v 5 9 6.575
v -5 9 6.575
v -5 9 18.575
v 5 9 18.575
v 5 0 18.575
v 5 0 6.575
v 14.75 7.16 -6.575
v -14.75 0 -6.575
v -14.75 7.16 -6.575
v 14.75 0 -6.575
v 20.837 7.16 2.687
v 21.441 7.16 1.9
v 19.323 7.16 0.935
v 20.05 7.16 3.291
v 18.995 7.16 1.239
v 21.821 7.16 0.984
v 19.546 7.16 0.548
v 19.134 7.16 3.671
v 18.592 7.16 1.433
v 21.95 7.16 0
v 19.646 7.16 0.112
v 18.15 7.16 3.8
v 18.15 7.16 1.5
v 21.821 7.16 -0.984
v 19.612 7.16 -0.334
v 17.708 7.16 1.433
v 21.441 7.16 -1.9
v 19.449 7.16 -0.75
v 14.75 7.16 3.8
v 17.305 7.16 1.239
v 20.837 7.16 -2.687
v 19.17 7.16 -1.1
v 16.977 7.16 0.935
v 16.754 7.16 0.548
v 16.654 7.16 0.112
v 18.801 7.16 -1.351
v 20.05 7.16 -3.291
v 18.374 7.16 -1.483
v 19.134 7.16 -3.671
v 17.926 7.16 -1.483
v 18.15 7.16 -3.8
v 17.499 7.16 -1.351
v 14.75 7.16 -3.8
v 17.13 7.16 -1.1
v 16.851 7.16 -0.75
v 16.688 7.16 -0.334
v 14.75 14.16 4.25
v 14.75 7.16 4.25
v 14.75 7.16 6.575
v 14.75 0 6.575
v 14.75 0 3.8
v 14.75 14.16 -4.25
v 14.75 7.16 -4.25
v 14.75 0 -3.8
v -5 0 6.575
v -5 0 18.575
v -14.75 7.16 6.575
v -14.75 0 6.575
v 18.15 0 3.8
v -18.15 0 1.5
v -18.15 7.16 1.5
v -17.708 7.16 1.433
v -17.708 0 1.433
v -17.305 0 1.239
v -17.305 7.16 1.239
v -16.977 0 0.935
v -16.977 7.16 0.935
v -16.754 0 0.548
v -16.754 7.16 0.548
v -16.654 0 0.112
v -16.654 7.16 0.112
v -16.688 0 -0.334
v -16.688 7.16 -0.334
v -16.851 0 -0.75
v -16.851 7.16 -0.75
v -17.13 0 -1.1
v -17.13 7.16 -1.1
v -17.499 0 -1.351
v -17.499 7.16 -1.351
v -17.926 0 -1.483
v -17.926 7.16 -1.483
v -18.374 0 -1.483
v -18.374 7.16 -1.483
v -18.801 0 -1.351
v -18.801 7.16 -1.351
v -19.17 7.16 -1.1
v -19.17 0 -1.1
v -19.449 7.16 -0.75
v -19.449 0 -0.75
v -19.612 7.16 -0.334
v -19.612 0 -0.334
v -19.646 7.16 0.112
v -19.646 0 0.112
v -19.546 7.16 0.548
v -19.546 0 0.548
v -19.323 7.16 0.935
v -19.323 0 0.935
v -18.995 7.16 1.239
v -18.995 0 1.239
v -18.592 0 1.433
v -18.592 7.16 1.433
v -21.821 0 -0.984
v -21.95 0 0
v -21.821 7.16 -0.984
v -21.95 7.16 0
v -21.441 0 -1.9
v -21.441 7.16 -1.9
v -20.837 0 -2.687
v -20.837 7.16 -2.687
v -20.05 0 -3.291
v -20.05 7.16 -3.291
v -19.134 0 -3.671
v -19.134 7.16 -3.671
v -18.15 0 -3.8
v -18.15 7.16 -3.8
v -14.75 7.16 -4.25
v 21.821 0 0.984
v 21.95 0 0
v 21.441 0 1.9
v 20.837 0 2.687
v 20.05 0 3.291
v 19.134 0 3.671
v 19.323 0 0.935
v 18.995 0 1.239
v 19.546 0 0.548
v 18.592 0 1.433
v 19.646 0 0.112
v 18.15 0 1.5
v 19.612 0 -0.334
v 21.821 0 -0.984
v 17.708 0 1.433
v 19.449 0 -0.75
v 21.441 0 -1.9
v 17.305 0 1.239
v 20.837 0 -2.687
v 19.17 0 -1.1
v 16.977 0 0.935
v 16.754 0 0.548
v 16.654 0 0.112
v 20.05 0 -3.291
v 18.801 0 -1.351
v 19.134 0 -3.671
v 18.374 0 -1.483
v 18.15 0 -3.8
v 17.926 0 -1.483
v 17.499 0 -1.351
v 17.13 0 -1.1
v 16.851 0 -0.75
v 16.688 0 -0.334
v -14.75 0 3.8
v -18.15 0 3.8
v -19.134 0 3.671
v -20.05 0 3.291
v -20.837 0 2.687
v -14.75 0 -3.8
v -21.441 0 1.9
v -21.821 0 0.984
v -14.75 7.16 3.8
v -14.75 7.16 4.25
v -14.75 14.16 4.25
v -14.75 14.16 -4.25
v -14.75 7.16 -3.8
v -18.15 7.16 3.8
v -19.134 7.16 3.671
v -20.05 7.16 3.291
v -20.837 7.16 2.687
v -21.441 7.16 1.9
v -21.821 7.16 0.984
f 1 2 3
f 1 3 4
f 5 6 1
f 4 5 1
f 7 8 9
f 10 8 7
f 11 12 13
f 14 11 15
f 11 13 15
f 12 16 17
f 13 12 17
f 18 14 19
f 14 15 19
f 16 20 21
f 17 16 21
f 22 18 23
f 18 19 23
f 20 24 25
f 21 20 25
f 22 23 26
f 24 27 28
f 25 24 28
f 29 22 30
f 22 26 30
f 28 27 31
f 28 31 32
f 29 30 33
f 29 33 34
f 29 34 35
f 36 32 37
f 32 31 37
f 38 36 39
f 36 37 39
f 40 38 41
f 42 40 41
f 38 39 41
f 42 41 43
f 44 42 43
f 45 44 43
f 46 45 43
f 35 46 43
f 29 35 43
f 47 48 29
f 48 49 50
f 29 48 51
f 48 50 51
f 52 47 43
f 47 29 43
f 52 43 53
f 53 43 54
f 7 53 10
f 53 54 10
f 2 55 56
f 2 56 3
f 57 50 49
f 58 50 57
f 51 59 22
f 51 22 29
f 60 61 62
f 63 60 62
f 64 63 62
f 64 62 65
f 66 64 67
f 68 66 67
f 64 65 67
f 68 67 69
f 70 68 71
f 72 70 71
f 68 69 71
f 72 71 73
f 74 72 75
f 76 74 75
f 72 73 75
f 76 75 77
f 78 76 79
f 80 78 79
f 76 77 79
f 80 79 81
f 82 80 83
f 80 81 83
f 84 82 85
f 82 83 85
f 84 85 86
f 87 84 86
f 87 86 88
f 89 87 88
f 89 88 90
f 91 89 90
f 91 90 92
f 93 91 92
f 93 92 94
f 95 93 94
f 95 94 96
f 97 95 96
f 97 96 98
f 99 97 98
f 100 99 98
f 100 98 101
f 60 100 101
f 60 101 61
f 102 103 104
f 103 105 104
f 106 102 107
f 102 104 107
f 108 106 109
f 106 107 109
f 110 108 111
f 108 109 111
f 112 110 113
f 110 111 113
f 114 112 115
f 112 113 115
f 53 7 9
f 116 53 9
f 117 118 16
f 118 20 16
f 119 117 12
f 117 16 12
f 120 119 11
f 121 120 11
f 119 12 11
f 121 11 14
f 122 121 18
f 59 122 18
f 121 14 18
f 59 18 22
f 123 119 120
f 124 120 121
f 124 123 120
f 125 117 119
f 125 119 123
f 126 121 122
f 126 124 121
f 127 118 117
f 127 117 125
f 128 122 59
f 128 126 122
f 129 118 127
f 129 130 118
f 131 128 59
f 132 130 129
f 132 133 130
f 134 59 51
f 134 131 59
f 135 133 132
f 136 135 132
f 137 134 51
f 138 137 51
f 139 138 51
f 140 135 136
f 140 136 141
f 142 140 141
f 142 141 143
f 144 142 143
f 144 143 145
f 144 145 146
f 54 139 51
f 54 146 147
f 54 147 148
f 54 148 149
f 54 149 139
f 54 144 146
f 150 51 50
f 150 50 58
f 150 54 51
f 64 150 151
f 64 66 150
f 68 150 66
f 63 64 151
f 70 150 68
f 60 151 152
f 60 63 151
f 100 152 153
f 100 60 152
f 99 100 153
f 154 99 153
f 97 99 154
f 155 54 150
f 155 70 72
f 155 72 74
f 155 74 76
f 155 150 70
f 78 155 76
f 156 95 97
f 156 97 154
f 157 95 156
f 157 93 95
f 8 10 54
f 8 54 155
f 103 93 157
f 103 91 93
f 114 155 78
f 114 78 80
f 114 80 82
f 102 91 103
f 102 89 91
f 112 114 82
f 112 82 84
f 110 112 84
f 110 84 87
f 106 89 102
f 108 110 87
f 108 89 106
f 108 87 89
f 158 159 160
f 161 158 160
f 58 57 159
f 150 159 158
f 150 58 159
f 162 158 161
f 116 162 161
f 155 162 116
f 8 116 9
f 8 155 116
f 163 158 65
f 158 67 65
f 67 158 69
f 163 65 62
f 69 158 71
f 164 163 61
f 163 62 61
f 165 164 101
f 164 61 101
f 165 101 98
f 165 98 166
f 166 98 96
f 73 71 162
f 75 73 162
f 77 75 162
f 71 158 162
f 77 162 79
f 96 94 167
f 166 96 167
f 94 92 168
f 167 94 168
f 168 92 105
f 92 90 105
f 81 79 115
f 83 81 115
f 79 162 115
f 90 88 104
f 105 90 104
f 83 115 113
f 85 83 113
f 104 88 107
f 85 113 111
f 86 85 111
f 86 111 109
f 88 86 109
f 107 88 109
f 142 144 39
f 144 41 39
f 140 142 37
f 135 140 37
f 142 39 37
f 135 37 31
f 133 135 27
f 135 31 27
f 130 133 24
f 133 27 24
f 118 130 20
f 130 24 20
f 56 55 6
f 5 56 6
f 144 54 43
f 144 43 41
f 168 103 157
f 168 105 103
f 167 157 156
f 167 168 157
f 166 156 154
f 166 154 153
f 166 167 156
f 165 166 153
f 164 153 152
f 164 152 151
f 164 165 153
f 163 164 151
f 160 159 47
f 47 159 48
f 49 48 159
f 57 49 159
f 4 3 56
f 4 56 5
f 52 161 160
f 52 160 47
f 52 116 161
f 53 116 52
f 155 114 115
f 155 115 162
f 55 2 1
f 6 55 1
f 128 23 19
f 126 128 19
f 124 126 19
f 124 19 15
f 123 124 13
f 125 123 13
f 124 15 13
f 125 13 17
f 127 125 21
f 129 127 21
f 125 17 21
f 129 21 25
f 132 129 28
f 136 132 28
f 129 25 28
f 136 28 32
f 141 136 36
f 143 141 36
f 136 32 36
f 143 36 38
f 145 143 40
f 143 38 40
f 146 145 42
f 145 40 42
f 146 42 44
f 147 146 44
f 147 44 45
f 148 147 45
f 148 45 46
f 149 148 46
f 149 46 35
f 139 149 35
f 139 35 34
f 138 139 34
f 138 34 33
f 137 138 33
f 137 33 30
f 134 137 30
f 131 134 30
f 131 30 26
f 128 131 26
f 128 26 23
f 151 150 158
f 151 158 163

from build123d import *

# Parameters (mm, degrees)
BOSS_EXTRUDE1_DEPTH = 7.16
FILLET2_R           = 3.8
FILLET3_R           = 3.8
FILLET4_R           = 3.8
FILLET5_R           = 3.8
SKETCH2_W           = 29.5
SKETCH2_H           = 8.5
BOSS_EXTRUDE2_DEPTH = 7
SKETCH3_W           = 10
SKETCH3_H           = 9
BOSS_EXTRUDE4_DEPTH = 12
SKETCH4_R           = 1.5
CUT_EXTRUDE1_DEPTH  = 9


with BuildPart() as part:
    # Sketch1 → Boss-Extrude1 (new body)
    with BuildSketch(Plane(origin=(0, 0, 0), x_dir=(1, 0, 0), z_dir=(0, 1, 0))):
        Polygon((21.95, -3.8), (14.75, -3.8), (14.75, -6.575), (-14.75, -6.575), (-14.75, -3.8), (-21.95, -3.8), (-21.95, 3.8), (-14.75, 3.8), (-14.75, 6.575), (14.75, 6.575), (14.75, 3.8), (21.95, 3.8), align=None)
    extrude(amount=BOSS_EXTRUDE1_DEPTH)

    # Fillet2
    fillet2_edges = [part.edges().sort_by_distance(p)[0] for p in [
        (-21.95, 3.58, -3.8),
    ]]
    fillet(fillet2_edges, radius=FILLET2_R)

    # Fillet3
    fillet3_edges = [part.edges().sort_by_distance(p)[0] for p in [
        (-21.95, 3.58, 3.8),
    ]]
    fillet(fillet3_edges, radius=FILLET3_R - 0.0001)  # a hair under: the kernel refuses the full size

    # Fillet4
    fillet4_edges = [part.edges().sort_by_distance(p)[0] for p in [
        (21.95, 3.58, -3.8),
    ]]
    fillet(fillet4_edges, radius=FILLET4_R)

    # Fillet5
    fillet5_edges = [part.edges().sort_by_distance(p)[0] for p in [
        (21.95, 3.58, 3.8),
    ]]
    fillet(fillet5_edges, radius=FILLET5_R - 0.0001)  # a hair under: the kernel refuses the full size

    # Sketch2 → Boss-Extrude2 (add)
    with BuildSketch(Plane(origin=(0, 7.16, 0), x_dir=(1, 0, 0), z_dir=(0, 1, 0))):
        Rectangle(SKETCH2_W, SKETCH2_H)
    extrude(amount=BOSS_EXTRUDE2_DEPTH)

    # Sketch4 → Cut-Extrude1 (cut)
    with BuildSketch(Plane(origin=(0, 7.16, 0), x_dir=(1, 0, 0), z_dir=(0, 1, 0))):
        with Locations(Location((-18.15, 0, 0), (0, 0, 270))):
            Circle(SKETCH4_R)
        with Locations(Location((18.15, 0, 0), (0, 0, 270))):
            Circle(SKETCH4_R)
    extrude(amount=-CUT_EXTRUDE1_DEPTH, mode=Mode.SUBTRACT)


with BuildPart() as body_2:
    # Sketch3 → Boss-Extrude4 (new body)
    with BuildSketch(Plane.XY.offset(6.575)):
        with Locations((0, 4.5)):
            Rectangle(SKETCH3_W, SKETCH3_H)
    extrude(amount=BOSS_EXTRUDE4_DEPTH)


solid = Compound([part.part, body_2.part])
